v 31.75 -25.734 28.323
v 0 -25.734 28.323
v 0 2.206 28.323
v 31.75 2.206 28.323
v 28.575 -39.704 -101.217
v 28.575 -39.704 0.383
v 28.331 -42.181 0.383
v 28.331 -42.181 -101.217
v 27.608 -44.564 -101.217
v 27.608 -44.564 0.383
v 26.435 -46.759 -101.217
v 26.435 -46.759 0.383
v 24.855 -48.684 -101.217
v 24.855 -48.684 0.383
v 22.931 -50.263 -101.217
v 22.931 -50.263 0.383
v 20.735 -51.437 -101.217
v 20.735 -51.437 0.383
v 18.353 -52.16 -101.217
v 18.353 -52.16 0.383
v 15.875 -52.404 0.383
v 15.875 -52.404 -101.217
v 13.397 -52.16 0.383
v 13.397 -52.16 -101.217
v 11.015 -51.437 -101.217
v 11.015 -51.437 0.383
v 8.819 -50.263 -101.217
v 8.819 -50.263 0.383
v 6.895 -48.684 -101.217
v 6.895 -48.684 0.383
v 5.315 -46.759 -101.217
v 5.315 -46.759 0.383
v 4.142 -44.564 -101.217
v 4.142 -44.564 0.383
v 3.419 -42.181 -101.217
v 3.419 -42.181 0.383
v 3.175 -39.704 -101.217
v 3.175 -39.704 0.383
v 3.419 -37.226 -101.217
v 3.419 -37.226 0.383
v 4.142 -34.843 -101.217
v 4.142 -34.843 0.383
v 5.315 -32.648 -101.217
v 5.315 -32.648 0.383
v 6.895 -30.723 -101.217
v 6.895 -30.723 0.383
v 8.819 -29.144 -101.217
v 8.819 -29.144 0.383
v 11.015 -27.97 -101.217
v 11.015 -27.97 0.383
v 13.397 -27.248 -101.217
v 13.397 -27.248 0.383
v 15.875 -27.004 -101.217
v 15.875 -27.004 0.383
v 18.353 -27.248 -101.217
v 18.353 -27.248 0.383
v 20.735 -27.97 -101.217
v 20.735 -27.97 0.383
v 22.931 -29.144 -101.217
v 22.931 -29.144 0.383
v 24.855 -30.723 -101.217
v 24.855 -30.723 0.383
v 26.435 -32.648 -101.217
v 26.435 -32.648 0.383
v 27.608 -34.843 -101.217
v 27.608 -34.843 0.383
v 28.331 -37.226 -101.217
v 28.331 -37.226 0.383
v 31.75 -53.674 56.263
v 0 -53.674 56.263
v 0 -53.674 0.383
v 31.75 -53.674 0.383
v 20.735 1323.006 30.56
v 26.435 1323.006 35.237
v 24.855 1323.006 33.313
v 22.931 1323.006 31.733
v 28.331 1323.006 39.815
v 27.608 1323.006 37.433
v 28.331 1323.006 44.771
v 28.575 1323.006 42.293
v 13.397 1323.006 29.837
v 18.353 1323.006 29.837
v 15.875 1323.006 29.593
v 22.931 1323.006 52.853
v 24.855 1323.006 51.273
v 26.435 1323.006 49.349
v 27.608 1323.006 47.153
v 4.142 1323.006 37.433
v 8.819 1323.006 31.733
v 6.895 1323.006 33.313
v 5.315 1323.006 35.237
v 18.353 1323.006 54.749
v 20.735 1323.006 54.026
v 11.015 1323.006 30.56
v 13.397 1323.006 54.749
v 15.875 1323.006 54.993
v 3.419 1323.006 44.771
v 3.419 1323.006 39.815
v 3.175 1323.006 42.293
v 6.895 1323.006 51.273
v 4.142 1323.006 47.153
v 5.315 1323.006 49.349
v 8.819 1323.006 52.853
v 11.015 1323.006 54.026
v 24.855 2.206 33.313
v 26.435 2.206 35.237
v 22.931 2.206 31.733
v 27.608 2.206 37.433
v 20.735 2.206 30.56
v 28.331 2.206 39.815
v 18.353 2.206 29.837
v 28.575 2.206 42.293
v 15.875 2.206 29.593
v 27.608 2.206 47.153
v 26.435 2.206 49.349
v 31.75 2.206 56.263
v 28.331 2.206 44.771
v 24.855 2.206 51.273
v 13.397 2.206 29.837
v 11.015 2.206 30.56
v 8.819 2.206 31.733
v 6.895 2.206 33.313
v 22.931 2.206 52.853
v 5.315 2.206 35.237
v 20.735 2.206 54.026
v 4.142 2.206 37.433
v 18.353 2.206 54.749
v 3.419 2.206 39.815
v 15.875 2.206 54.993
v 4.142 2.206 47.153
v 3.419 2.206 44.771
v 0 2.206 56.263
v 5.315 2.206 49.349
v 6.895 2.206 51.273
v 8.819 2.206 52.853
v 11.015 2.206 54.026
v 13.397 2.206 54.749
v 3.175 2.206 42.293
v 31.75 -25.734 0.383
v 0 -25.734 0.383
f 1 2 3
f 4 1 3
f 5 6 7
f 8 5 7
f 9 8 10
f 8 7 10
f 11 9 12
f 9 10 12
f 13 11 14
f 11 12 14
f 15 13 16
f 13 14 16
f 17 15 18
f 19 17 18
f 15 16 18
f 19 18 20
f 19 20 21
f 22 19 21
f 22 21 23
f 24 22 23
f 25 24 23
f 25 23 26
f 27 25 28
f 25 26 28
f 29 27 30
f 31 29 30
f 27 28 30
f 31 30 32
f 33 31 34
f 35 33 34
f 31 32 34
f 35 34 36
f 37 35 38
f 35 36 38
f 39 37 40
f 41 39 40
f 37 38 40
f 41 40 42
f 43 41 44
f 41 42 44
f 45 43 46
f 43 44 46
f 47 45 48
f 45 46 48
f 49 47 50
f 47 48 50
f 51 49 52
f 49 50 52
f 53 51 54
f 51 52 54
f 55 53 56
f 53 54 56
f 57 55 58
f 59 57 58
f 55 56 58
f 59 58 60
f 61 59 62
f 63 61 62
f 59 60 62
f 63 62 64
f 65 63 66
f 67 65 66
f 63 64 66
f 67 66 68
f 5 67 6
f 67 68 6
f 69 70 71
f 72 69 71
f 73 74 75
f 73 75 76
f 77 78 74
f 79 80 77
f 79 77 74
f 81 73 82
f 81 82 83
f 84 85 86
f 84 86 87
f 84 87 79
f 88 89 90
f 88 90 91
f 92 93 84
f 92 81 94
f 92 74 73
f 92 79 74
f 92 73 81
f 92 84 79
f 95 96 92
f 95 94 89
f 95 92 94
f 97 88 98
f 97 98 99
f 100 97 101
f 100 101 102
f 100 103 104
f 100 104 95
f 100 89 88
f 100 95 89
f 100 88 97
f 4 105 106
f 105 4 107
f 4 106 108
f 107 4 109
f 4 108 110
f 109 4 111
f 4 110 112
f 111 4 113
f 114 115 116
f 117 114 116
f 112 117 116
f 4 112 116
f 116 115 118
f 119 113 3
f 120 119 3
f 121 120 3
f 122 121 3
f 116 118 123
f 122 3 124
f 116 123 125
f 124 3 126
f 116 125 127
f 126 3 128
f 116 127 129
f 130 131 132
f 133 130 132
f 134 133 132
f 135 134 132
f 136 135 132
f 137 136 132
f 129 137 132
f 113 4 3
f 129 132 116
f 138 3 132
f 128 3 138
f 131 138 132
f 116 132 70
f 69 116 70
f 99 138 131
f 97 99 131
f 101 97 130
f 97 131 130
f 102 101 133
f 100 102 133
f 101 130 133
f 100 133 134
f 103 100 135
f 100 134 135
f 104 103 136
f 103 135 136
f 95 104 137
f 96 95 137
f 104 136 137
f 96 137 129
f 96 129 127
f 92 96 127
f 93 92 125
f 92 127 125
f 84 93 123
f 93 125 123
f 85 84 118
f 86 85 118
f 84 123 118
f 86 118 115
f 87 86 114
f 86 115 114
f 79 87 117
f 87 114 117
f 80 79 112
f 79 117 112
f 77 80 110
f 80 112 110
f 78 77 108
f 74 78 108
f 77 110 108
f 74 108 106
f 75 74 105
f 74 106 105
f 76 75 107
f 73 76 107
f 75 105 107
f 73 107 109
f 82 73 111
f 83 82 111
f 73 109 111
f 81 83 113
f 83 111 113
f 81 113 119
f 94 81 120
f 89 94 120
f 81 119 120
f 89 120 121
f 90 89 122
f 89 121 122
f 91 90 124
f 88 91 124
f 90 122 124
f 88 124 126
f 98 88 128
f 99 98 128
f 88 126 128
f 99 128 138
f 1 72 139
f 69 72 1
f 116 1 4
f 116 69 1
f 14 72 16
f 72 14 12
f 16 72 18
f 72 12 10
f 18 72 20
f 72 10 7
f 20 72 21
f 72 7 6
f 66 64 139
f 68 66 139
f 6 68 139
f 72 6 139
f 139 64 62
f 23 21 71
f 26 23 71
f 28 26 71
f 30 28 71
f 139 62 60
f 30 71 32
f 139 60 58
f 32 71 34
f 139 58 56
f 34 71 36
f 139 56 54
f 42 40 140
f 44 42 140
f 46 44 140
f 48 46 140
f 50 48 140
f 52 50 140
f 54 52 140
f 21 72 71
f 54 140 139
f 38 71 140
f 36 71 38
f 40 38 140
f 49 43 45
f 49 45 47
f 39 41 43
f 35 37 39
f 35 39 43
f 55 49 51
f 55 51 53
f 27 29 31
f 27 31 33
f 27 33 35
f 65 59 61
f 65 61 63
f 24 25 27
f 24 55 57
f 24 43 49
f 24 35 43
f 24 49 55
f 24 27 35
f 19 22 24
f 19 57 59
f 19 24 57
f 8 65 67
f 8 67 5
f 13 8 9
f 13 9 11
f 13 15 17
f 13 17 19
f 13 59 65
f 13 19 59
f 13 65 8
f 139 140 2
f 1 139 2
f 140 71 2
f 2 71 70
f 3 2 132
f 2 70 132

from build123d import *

# Parameters (mm, degrees)
F1_DEPTH = 31.75
F2_R     = 12.7
F3_DEPTH = 1320.8
F4_R     = 12.7
F5_DEPTH = 101.6


with BuildPart() as f1:
    # F0 (on Right) → F1 (new body)
    with BuildSketch(Plane.YZ):
        Polygon((-25.733576, 56.262951), (-53.673576, 56.262951), (-53.673576, 0.382951), (-25.733576, 0.382951), (-25.733576, 28.322951), (2.206424, 28.322951), (2.206424, 56.262951), align=None)
    extrude(amount=F1_DEPTH)

    # F2 (on face) → F3 (join)
    with BuildSketch(Plane(origin=(0, 2.206424, 0), x_dir=(-1, 0, 0), z_dir=(0, 1, 0))):
        with Locations((-15.875, 42.292951)):
            Circle(F2_R)
    extrude(amount=F3_DEPTH)

    # F4 (on face) → F5 (join)
    with BuildSketch(Plane(origin=(0, 0, 0.382951), x_dir=(1, 0, 0), z_dir=(0, 0, -1))):
        with Locations((15.875, 39.703576)):
            Circle(F4_R)
    extrude(amount=F5_DEPTH)


solid = f1.part
